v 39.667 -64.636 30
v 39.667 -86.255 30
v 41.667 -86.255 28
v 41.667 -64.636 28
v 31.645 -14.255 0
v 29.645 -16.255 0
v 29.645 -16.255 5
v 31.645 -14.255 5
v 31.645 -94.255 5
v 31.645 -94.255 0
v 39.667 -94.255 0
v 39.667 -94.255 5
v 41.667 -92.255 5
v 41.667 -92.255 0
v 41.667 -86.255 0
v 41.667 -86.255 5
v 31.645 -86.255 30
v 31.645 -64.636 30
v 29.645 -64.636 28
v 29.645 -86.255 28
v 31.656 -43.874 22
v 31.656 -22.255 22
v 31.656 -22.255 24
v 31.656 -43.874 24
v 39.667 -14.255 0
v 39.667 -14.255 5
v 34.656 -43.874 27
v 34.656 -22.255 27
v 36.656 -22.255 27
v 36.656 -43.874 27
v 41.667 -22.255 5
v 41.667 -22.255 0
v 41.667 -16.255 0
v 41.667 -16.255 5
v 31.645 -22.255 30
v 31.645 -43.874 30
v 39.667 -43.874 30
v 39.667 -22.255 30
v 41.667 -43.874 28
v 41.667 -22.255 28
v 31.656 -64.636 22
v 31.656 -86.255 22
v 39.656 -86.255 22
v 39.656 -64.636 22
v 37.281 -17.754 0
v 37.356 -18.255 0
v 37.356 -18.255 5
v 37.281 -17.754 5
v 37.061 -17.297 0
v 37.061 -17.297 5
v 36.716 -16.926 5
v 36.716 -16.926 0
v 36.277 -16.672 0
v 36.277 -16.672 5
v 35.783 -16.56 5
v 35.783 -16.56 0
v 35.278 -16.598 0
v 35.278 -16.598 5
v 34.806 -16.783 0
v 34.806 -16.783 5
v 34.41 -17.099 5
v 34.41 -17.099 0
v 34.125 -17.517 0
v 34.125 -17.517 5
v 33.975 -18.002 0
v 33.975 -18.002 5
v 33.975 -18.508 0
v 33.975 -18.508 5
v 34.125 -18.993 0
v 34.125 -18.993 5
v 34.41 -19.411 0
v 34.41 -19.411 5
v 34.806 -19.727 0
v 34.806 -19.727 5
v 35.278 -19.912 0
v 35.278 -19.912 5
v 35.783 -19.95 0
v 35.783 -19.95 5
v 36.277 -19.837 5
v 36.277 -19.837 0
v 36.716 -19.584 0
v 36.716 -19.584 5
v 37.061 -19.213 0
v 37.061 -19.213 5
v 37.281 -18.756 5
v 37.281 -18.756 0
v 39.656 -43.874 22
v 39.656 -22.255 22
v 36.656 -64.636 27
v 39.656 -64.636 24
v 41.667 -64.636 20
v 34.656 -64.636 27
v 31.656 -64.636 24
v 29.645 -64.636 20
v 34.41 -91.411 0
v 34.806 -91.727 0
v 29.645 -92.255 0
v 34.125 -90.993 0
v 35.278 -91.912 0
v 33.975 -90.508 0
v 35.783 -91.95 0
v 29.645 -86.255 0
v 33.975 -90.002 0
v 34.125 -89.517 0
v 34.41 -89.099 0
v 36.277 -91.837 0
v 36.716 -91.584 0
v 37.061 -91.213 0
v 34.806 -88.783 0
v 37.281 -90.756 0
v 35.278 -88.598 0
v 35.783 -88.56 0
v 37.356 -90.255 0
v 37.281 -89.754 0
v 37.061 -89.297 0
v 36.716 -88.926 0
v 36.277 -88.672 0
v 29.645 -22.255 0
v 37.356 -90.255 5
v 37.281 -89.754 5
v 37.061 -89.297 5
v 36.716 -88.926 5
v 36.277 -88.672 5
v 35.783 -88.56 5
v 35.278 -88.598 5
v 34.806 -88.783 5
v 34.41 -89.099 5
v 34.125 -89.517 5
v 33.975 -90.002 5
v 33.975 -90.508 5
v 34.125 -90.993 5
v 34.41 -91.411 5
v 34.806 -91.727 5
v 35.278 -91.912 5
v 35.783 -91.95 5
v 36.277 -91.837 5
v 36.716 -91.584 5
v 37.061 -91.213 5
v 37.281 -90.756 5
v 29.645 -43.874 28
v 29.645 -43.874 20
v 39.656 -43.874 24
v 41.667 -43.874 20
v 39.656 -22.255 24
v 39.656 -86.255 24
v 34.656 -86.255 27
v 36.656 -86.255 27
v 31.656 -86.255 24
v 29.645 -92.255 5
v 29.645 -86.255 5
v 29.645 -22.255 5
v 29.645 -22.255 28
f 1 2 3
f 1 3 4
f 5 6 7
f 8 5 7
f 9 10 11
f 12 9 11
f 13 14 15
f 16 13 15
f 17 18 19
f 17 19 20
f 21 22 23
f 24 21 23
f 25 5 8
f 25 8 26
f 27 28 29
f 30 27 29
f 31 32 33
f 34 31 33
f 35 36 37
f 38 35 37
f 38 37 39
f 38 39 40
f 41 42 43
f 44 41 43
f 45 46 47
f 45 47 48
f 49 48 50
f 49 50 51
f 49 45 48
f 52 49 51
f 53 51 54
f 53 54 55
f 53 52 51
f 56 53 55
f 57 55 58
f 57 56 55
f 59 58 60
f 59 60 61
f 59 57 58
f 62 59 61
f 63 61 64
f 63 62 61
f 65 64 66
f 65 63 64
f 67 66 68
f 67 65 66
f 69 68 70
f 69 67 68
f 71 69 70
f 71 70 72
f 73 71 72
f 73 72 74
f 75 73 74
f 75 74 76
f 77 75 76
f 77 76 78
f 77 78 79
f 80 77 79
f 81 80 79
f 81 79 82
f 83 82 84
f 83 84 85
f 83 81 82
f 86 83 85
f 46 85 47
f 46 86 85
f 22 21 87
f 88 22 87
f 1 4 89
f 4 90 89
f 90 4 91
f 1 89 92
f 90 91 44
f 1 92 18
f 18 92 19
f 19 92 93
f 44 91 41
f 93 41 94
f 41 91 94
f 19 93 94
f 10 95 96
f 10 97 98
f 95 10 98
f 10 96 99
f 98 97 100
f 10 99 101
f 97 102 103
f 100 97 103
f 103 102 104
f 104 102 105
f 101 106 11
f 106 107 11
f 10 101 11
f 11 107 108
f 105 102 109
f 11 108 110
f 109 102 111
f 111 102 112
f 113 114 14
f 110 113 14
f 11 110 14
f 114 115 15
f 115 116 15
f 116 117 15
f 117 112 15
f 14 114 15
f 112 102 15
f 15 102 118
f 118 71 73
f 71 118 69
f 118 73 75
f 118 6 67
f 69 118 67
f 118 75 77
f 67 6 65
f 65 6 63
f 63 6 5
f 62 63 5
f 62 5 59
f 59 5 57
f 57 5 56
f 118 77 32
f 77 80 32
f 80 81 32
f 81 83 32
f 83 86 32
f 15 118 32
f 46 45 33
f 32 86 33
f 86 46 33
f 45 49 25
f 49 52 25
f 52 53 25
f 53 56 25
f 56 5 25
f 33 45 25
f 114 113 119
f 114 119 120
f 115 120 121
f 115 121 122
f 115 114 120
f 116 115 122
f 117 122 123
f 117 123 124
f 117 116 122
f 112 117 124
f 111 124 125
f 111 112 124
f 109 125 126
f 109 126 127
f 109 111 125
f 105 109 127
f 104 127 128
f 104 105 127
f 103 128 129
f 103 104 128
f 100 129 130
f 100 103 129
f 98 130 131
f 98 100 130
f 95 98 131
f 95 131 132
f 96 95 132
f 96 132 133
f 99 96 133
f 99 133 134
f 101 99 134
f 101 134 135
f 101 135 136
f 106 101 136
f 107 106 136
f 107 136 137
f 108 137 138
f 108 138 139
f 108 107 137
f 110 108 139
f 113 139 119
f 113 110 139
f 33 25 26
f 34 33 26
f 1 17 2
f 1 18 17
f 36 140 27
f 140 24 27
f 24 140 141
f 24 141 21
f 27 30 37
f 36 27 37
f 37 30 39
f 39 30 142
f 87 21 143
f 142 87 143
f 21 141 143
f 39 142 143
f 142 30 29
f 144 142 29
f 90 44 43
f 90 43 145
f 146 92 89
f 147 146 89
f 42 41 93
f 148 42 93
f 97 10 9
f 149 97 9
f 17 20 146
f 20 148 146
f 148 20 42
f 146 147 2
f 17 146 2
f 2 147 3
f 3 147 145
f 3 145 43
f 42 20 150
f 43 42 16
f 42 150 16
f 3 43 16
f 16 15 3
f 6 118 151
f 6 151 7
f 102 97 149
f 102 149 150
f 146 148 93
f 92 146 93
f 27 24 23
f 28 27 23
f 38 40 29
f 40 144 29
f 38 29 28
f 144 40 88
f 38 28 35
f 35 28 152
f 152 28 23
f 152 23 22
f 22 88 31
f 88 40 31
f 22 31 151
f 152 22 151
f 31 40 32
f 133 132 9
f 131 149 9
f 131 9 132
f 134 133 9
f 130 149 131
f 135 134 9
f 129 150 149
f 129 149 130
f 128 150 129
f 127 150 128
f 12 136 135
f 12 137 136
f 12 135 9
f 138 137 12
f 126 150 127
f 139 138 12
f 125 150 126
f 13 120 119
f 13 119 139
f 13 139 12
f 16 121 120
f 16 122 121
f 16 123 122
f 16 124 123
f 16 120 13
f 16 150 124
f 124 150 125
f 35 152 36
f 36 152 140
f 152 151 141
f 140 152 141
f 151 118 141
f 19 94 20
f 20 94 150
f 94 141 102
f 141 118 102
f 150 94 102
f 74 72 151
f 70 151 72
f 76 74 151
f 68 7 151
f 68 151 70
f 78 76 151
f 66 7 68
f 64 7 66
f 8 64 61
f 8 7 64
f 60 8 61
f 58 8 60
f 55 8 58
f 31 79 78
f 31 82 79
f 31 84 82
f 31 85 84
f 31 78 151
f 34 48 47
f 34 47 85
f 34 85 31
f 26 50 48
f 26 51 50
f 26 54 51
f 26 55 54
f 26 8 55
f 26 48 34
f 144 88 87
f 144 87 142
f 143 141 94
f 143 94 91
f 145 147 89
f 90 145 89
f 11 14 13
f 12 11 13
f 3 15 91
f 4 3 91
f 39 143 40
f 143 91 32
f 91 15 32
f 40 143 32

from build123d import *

# Parameters (mm, degrees)
F0_W     = 12.022123
F0_H     = 8
F0_R     = 1.7
F1_DEPTH = 5
F2_DEPTH = 30
F3_DEPTH = 20
F4_W     = 8
F4_H     = 5
F5_DEPTH = 72.001
F6_SIZE  = 3
F7_SIZE  = 2


with BuildPart() as f1:
    # F0 (on Top) → F1 (new body)
    with BuildSketch(Plane.XY):
        with Locations((35.656364, -18.254959)):
            Rectangle(F0_W, F0_H)
        with Locations((35.656365, -18.254959)):
            Circle(F0_R, mode=Mode.SUBTRACT)
        Polygon((41.667426, -22.254959), (29.645303, -22.254959), (29.645303, -43.874378), (35.656365, -43.874378), (41.667426, -43.874378), align=None)
        Polygon((35.656365, -43.874378), (29.645303, -43.874378), (29.645303, -54.254959), (29.645303, -64.63554), (35.656365, -64.63554), (41.667426, -64.63554), (41.667426, -54.254959), (41.667426, -43.874378), align=None)
        Polygon((35.656365, -64.63554), (29.645303, -64.63554), (29.645303, -86.254959), (41.667426, -86.254959), (41.667426, -64.63554), align=None)
        with Locations((35.656364, -90.254959)):
            Rectangle(F0_W, F0_H)
        with Locations((35.656365, -90.254959)):
            Circle(F0_R, mode=Mode.SUBTRACT)
    extrude(amount=F1_DEPTH)

    # F0 (on Top) → F2 (join)
    with BuildSketch(Plane.XY):
        Polygon((41.667426, -22.254959), (29.645303, -22.254959), (29.645303, -43.874378), (35.656365, -43.874378), (41.667426, -43.874378), align=None)
        Polygon((35.656365, -64.63554), (29.645303, -64.63554), (29.645303, -86.254959), (41.667426, -86.254959), (41.667426, -64.63554), align=None)
    extrude(amount=F2_DEPTH)

    # F0 (on Top) → F3 (join)
    with BuildSketch(Plane.XY):
        Polygon((35.656365, -43.874378), (29.645303, -43.874378), (29.645303, -54.254959), (29.645303, -64.63554), (35.656365, -64.63554), (41.667426, -64.63554), (41.667426, -54.254959), (41.667426, -43.874378), align=None)
    extrude(amount=F3_DEPTH)

    # F4 (on face) → F5 (cut, through all)
    with BuildSketch(Plane.XZ.offset(86.254959)):
        with Locations((35.656365, 24.5)):
            Rectangle(F4_W, F4_H)
    extrude(amount=-F5_DEPTH, mode=Mode.SUBTRACT)

    # F6
    f6_edges = [f1.edges().sort_by_distance(p)[0] for p in [
        (31.656365, -75.44525, 27),
        (31.656365, -33.064669, 27),
        (39.656365, -75.44525, 27),
        (39.656365, -33.064669, 27),
    ]]
    chamfer(f6_edges, length=F6_SIZE)

    # F7
    f7_edges = [f1.edges().sort_by_distance(p)[0] for p in [
        (29.645303, -94.254959, 2.5),
        (41.667426, -94.254959, 2.5),
        (29.645303, -14.254959, 2.5),
        (41.667426, -14.254959, 2.5),
        (41.667426, -33.064669, 30),
        (29.645303, -33.064669, 30),
        (29.645303, -75.44525, 30),
        (41.667426, -75.44525, 30),
    ]]
    chamfer(f7_edges, length=F7_SIZE)


solid = f1.part
